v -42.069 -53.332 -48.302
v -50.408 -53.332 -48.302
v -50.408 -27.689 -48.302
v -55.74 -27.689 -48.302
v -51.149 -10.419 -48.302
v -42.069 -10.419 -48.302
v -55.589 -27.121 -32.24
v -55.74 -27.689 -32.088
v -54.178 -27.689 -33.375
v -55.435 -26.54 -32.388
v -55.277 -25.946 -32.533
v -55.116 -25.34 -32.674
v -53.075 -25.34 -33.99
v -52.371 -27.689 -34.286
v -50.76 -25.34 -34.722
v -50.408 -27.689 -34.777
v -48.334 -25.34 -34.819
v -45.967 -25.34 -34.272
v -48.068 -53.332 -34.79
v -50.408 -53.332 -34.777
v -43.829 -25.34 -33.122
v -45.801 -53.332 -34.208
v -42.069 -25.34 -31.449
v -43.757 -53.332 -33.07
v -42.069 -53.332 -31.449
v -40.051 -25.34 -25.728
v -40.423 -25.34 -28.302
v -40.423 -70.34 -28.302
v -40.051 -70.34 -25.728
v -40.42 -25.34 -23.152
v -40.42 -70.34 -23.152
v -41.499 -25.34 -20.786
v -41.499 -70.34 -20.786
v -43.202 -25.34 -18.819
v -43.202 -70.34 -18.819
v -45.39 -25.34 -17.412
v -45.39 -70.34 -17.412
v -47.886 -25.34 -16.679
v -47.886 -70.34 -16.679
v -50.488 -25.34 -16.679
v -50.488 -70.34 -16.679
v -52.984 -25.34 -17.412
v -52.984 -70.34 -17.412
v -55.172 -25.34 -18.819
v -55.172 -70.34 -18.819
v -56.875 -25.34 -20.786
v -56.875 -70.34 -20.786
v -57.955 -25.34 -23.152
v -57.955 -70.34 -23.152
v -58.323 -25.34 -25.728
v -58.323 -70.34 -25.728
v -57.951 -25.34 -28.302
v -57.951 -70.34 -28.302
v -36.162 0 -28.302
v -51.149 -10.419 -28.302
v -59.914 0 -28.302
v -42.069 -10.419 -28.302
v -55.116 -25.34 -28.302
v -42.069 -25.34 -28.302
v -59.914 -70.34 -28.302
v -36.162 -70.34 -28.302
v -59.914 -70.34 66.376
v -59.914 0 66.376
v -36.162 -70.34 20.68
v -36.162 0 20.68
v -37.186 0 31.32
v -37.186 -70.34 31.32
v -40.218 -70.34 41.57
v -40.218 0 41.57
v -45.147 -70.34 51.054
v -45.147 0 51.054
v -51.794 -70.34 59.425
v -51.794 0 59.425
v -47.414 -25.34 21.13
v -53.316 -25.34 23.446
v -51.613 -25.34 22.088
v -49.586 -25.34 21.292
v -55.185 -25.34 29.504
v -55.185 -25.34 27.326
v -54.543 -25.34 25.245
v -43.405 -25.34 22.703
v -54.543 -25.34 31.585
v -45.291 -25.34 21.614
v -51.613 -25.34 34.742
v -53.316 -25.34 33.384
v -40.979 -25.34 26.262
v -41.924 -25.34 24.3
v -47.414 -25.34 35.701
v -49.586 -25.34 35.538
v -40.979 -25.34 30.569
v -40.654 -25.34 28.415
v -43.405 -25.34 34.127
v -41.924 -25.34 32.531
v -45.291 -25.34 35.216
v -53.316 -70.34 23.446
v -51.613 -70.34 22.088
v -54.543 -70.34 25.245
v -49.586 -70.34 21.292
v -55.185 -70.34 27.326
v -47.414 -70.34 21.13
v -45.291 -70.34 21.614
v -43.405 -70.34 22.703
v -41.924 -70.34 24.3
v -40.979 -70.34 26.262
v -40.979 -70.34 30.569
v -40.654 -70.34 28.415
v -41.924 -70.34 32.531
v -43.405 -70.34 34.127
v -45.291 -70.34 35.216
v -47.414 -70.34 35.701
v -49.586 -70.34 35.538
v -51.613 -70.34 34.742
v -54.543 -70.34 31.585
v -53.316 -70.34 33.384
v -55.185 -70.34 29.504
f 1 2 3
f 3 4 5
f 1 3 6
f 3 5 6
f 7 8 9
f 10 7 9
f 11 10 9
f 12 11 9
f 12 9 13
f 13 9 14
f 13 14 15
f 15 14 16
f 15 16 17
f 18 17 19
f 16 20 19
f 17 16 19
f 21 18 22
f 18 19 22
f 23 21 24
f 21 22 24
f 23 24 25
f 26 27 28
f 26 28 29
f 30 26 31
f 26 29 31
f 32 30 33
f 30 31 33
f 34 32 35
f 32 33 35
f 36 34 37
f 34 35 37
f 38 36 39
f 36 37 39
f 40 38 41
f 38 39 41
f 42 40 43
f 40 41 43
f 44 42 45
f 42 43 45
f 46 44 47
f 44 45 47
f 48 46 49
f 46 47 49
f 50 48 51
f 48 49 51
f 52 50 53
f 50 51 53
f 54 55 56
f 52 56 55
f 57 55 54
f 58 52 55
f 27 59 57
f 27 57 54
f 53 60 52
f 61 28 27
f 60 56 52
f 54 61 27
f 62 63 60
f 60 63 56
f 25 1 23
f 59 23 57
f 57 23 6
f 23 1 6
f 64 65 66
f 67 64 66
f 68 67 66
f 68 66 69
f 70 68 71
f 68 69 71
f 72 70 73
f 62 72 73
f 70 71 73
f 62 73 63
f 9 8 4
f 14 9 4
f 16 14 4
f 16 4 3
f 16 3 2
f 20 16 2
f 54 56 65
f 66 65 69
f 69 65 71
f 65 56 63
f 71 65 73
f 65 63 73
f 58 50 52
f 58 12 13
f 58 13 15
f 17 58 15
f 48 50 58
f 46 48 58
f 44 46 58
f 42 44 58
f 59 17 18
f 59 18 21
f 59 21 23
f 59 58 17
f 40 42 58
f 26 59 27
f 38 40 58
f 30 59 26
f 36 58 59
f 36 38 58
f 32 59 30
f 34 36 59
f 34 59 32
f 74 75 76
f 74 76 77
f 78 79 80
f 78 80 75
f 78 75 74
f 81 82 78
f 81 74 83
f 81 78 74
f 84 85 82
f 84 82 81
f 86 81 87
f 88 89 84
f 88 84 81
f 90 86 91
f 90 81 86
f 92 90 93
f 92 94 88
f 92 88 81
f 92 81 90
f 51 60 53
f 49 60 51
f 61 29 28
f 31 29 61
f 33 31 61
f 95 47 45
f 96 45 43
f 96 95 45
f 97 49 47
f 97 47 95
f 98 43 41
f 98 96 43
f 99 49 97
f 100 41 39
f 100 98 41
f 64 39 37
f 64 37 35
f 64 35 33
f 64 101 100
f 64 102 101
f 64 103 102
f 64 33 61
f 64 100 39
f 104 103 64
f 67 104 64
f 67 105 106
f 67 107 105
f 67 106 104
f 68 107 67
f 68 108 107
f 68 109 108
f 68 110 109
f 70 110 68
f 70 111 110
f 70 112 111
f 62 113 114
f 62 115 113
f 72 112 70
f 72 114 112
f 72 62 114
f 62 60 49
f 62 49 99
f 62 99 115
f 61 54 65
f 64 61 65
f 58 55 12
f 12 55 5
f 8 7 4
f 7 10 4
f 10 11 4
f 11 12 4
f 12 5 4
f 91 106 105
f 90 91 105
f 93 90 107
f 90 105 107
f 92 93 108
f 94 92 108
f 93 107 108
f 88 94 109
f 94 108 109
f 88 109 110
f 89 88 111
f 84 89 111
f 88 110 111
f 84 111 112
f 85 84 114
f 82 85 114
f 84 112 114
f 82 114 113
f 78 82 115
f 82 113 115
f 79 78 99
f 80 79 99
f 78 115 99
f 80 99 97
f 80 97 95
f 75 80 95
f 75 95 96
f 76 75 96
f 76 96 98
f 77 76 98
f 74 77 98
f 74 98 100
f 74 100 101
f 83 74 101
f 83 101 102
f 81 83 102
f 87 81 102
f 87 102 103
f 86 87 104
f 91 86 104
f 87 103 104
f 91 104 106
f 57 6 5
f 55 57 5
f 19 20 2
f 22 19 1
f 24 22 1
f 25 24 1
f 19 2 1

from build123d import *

# Parameters (mm, degrees)
F1_DEPTH = 70.3398883343
F3_R     = 7.3058881184
F3_R_2   = 9.1363164158
F4_DEPTH = 45
F5_W     = 23.752015084
F5_H     = 70.3398883343
F6_DEPTH = 20


with BuildPart() as f1:
    # F0 (on Front) → F1 (new body)
    with BuildSketch(Plane.XZ):
        with BuildLine():
            ThreePointArc((-36.1624062061, 20.6797644496), (-42.455005515, 46.4301466614), (-59.9144212902, 66.3762688637))
            Line((-59.9144212902, 66.3762688637), (-59.9144212902, -48.3024045825))
            Line((-59.9144212902, -48.3024045825), (-36.1624062061, -48.3024045825))
            Line((-36.1624062061, -48.3024045825), (-36.1624062061, 20.6797644496))
        make_face()
    extrude(amount=F1_DEPTH)

    # F3 (on face) → F4 (cut)
    with BuildSketch(Plane.XZ.offset(70.3398883343)):
        with Locations((-47.960318625, 28.4151956439)):
            Circle(F3_R)
        with Locations((-49.1870157421, -25.7221646607)):
            Circle(F3_R_2)
    extrude(amount=-F4_DEPTH, mode=Mode.SUBTRACT)

    # F5 (on face) → F6 (cut)
    with BuildSketch(Plane(origin=(0, 0, -48.3024045825), x_dir=(1, 0, 0), z_dir=(0, 0, -1))):
        with Locations((-48.0384137481, 35.1699441671)):
            Rectangle(F5_W, F5_H)
        Polygon((-42.0686118305, 10.4190278798), (-51.1485151947, 10.4190278798), (-55.7404533029, 27.6891775429), (-50.4079498351, 27.6891775429), (-50.4079498351, 53.3323399723), (-42.0686118305, 53.3323399723), align=None, mode=Mode.SUBTRACT)
    extrude(amount=-F6_DEPTH, mode=Mode.SUBTRACT)


solid = f1.part
